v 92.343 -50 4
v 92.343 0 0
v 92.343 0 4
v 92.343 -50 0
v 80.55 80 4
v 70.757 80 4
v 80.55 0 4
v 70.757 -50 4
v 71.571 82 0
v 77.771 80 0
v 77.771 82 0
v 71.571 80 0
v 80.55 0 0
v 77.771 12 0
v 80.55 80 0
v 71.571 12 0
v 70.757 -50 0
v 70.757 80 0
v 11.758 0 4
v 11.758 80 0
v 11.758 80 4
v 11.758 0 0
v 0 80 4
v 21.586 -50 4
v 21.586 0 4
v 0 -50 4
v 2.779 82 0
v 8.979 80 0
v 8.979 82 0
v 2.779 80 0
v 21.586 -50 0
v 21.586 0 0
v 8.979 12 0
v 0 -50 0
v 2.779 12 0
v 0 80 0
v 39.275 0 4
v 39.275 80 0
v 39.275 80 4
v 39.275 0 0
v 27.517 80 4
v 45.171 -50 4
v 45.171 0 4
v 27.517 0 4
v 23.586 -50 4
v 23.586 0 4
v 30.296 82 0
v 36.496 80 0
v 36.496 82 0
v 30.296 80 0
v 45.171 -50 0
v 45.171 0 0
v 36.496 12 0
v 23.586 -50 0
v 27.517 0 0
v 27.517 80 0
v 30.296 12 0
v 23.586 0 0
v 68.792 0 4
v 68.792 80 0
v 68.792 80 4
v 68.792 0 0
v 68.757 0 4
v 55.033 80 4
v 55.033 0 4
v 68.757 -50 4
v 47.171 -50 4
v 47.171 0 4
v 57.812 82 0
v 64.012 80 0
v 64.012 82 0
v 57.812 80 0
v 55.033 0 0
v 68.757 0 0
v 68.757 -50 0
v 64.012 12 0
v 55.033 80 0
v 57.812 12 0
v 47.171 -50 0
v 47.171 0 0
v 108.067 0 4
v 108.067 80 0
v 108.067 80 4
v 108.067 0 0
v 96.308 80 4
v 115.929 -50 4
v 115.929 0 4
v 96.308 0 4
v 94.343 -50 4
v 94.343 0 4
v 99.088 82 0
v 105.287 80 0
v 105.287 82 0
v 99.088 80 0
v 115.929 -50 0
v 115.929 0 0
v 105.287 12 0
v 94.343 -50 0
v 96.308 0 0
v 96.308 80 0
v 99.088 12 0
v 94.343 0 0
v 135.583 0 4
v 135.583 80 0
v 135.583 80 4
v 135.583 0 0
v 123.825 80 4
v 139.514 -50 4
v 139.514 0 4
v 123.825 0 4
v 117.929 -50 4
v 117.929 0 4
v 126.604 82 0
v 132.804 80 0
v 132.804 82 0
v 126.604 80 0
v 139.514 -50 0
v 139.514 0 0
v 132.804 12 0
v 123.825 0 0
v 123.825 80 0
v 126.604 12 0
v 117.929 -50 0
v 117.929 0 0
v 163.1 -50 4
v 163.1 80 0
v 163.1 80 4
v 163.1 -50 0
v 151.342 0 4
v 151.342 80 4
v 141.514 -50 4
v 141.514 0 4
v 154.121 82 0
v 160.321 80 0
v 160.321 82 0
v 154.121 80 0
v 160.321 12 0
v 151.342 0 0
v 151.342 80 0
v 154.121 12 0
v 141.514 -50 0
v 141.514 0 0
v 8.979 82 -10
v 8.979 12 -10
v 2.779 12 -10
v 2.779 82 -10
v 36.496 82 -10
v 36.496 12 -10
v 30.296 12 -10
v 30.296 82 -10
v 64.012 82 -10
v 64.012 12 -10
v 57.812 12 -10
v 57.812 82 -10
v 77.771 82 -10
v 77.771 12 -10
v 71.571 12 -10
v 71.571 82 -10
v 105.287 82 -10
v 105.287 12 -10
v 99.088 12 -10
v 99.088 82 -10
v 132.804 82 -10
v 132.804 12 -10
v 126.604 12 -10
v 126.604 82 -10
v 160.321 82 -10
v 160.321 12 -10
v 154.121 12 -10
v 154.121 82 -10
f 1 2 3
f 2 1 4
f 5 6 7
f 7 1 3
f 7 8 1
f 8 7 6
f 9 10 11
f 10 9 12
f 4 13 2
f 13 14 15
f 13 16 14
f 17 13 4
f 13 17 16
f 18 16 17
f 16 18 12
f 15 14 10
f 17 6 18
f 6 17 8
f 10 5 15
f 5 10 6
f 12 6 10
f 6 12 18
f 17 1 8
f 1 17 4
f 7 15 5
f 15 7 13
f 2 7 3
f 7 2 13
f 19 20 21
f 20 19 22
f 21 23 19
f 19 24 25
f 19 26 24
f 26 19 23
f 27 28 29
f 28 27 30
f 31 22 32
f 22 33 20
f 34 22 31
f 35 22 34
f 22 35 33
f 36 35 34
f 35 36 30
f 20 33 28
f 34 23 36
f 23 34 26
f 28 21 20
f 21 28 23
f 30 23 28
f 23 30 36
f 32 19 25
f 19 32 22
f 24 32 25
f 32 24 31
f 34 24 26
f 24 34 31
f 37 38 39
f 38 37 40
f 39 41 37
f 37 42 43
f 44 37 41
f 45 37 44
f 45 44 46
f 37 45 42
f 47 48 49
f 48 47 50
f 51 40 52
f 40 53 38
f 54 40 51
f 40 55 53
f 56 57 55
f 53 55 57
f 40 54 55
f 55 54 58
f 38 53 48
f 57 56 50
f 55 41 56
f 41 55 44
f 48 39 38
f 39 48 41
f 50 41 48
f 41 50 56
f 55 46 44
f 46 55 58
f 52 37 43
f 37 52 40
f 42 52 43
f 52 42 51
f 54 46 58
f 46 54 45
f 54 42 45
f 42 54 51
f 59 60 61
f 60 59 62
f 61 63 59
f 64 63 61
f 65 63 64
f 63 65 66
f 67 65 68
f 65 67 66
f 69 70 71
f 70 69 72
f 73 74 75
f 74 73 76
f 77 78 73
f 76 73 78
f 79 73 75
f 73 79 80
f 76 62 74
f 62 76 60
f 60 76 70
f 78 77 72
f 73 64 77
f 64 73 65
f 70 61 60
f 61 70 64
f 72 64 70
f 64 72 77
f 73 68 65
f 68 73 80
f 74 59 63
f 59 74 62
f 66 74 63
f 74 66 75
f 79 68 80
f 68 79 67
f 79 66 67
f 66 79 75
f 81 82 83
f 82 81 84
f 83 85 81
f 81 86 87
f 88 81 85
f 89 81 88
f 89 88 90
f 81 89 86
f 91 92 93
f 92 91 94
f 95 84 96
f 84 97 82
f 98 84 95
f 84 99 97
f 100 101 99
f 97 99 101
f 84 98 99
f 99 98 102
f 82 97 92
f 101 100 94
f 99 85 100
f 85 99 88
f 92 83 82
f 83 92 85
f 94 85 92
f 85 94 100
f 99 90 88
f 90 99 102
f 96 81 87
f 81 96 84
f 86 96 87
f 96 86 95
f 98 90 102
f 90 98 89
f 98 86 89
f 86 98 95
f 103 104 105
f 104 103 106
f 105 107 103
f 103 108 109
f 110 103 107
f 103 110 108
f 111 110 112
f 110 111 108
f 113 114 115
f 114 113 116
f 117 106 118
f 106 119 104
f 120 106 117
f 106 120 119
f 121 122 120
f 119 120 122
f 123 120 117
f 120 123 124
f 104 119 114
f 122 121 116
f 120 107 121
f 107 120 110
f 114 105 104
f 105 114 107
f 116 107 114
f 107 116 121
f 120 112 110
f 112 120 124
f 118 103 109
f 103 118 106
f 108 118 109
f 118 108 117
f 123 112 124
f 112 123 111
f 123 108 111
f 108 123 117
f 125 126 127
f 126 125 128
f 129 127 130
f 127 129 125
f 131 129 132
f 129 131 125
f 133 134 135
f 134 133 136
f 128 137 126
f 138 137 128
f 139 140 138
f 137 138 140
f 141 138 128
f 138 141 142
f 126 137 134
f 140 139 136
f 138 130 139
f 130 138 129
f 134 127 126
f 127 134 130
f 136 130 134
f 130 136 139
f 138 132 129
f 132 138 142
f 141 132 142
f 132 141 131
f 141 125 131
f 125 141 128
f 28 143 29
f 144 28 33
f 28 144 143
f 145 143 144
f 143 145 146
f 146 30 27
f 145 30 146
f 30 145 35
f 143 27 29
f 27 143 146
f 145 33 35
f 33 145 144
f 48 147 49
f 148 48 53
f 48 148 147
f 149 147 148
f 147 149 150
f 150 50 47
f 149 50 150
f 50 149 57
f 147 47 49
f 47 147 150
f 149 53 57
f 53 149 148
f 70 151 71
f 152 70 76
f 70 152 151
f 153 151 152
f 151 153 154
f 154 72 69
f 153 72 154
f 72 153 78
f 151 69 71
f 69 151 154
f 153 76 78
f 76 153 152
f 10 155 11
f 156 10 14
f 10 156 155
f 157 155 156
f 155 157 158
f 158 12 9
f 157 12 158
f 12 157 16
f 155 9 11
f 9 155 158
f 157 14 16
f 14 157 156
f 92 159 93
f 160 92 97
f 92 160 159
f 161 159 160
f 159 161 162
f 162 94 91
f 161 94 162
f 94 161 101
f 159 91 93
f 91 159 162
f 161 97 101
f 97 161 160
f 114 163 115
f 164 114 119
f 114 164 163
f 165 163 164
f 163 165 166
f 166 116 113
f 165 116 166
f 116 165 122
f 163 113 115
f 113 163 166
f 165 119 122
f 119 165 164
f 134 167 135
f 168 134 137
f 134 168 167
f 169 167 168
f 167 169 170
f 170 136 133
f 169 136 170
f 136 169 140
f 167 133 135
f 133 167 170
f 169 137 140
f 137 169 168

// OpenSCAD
kH = 4;
bH = 10;
wL = 50;
bL = 80;
oct = 6.5 * 25.4;
gap = 2;
n_oct = 1;
n_keys = 12 * n_oct;
oset = -1;

sharpFlag = 0;

for (k = [0:1:(n_oct-1)]){

//C:
translate([k*oct+0,0,0]) cube([oct*1/12-gap,bL,kH]);
translate([k*oct+0,-wL,0]) cube([oct*1/7-gap,wL,kH]);

//C#:
if (sharpFlag){    
translate([k*oct+oct*1/12,gap,0]) cube([oct*1/12-gap,bL,kH+bH]);
}

//D:
translate([k*oct+oct*2/12,0,0]) cube([oct*1/12-gap,bL,kH]);
translate([k*oct+oct*1/7,-wL,0]) cube([oct*1/7-gap,wL,kH]);

//D#:
if (sharpFlag){
translate([k*oct+oct*3/12,gap,0]) cube([oct*1/12-gap,bL,kH+bH]);
}

//E:
translate([k*oct+oct*4/12,0,0]) cube([2+oct*1/12-gap,bL,kH]);
translate([k*oct+oct*2/7,-wL,0]) cube([oct*1/7-gap,wL,kH]);

//F:
difference(){
    translate([k*oct+oct*3/7,-wL,0]) cube([oct*1/7-gap,wL+bL,kH]);
    translate([k*oct+oct*6/12-2,0,0]) cube([4+oct*(1/7-1/12)-gap,bL,kH]);
}
translate([k*oct+oct*3/7,-wL,0]) cube([oct*1/7-gap,wL,kH]);

//F#:
if (sharpFlag){
translate([k*oct+oct*6/12,gap,0]) cube([oct*1/12-gap,bL,kH+bH]);
}

//G:
translate([k*oct+oct*7/12,0,0]) cube([oct*1/12-gap,bL,kH]);
translate([k*oct+oct*4/7,-wL,0]) cube([oct*1/7-gap,wL,kH]);

//G#:
if (sharpFlag){
translate([k*oct+oct*8/12,gap,0]) cube([oct*1/12-gap,bL,kH+bH]);
}

//A:
translate([k*oct+oct*9/12,0,0]) cube([oct*1/12-gap,bL,kH]);
translate([k*oct+oct*5/7,-wL,0]) cube([oct*1/7-gap,wL,kH]);

//A#:
if (sharpFlag){
translate([k*oct+oct*10/12,gap,0]) cube([oct*1/12-gap,bL,kH+bH]);
}

//B:
translate([k*oct+oct*11/12,0,0]) cube([oct*1/12-gap,bL,kH]);
translate([k*oct+oct*6/7,-wL,0]) cube([oct*1/7-gap,wL,kH]);

}

for (i = [0,2,4,5,7,9,11]){//[0:1:(n_keys-1)]){
    translate([oset+oct*i/12+(oct*1/12-6.2)/2,2+10,-10]) cube([6.2,bL-10,10]);
}

if (sharpFlag){
    for (i = [1,3,6,8,10]){//[0:1:(n_keys-1)]){
    translate([oset+oct*i/12+(oct*1/12-6.2)/2,2+10,-10]) cube([6.2,bL-10,10]);
}
}
